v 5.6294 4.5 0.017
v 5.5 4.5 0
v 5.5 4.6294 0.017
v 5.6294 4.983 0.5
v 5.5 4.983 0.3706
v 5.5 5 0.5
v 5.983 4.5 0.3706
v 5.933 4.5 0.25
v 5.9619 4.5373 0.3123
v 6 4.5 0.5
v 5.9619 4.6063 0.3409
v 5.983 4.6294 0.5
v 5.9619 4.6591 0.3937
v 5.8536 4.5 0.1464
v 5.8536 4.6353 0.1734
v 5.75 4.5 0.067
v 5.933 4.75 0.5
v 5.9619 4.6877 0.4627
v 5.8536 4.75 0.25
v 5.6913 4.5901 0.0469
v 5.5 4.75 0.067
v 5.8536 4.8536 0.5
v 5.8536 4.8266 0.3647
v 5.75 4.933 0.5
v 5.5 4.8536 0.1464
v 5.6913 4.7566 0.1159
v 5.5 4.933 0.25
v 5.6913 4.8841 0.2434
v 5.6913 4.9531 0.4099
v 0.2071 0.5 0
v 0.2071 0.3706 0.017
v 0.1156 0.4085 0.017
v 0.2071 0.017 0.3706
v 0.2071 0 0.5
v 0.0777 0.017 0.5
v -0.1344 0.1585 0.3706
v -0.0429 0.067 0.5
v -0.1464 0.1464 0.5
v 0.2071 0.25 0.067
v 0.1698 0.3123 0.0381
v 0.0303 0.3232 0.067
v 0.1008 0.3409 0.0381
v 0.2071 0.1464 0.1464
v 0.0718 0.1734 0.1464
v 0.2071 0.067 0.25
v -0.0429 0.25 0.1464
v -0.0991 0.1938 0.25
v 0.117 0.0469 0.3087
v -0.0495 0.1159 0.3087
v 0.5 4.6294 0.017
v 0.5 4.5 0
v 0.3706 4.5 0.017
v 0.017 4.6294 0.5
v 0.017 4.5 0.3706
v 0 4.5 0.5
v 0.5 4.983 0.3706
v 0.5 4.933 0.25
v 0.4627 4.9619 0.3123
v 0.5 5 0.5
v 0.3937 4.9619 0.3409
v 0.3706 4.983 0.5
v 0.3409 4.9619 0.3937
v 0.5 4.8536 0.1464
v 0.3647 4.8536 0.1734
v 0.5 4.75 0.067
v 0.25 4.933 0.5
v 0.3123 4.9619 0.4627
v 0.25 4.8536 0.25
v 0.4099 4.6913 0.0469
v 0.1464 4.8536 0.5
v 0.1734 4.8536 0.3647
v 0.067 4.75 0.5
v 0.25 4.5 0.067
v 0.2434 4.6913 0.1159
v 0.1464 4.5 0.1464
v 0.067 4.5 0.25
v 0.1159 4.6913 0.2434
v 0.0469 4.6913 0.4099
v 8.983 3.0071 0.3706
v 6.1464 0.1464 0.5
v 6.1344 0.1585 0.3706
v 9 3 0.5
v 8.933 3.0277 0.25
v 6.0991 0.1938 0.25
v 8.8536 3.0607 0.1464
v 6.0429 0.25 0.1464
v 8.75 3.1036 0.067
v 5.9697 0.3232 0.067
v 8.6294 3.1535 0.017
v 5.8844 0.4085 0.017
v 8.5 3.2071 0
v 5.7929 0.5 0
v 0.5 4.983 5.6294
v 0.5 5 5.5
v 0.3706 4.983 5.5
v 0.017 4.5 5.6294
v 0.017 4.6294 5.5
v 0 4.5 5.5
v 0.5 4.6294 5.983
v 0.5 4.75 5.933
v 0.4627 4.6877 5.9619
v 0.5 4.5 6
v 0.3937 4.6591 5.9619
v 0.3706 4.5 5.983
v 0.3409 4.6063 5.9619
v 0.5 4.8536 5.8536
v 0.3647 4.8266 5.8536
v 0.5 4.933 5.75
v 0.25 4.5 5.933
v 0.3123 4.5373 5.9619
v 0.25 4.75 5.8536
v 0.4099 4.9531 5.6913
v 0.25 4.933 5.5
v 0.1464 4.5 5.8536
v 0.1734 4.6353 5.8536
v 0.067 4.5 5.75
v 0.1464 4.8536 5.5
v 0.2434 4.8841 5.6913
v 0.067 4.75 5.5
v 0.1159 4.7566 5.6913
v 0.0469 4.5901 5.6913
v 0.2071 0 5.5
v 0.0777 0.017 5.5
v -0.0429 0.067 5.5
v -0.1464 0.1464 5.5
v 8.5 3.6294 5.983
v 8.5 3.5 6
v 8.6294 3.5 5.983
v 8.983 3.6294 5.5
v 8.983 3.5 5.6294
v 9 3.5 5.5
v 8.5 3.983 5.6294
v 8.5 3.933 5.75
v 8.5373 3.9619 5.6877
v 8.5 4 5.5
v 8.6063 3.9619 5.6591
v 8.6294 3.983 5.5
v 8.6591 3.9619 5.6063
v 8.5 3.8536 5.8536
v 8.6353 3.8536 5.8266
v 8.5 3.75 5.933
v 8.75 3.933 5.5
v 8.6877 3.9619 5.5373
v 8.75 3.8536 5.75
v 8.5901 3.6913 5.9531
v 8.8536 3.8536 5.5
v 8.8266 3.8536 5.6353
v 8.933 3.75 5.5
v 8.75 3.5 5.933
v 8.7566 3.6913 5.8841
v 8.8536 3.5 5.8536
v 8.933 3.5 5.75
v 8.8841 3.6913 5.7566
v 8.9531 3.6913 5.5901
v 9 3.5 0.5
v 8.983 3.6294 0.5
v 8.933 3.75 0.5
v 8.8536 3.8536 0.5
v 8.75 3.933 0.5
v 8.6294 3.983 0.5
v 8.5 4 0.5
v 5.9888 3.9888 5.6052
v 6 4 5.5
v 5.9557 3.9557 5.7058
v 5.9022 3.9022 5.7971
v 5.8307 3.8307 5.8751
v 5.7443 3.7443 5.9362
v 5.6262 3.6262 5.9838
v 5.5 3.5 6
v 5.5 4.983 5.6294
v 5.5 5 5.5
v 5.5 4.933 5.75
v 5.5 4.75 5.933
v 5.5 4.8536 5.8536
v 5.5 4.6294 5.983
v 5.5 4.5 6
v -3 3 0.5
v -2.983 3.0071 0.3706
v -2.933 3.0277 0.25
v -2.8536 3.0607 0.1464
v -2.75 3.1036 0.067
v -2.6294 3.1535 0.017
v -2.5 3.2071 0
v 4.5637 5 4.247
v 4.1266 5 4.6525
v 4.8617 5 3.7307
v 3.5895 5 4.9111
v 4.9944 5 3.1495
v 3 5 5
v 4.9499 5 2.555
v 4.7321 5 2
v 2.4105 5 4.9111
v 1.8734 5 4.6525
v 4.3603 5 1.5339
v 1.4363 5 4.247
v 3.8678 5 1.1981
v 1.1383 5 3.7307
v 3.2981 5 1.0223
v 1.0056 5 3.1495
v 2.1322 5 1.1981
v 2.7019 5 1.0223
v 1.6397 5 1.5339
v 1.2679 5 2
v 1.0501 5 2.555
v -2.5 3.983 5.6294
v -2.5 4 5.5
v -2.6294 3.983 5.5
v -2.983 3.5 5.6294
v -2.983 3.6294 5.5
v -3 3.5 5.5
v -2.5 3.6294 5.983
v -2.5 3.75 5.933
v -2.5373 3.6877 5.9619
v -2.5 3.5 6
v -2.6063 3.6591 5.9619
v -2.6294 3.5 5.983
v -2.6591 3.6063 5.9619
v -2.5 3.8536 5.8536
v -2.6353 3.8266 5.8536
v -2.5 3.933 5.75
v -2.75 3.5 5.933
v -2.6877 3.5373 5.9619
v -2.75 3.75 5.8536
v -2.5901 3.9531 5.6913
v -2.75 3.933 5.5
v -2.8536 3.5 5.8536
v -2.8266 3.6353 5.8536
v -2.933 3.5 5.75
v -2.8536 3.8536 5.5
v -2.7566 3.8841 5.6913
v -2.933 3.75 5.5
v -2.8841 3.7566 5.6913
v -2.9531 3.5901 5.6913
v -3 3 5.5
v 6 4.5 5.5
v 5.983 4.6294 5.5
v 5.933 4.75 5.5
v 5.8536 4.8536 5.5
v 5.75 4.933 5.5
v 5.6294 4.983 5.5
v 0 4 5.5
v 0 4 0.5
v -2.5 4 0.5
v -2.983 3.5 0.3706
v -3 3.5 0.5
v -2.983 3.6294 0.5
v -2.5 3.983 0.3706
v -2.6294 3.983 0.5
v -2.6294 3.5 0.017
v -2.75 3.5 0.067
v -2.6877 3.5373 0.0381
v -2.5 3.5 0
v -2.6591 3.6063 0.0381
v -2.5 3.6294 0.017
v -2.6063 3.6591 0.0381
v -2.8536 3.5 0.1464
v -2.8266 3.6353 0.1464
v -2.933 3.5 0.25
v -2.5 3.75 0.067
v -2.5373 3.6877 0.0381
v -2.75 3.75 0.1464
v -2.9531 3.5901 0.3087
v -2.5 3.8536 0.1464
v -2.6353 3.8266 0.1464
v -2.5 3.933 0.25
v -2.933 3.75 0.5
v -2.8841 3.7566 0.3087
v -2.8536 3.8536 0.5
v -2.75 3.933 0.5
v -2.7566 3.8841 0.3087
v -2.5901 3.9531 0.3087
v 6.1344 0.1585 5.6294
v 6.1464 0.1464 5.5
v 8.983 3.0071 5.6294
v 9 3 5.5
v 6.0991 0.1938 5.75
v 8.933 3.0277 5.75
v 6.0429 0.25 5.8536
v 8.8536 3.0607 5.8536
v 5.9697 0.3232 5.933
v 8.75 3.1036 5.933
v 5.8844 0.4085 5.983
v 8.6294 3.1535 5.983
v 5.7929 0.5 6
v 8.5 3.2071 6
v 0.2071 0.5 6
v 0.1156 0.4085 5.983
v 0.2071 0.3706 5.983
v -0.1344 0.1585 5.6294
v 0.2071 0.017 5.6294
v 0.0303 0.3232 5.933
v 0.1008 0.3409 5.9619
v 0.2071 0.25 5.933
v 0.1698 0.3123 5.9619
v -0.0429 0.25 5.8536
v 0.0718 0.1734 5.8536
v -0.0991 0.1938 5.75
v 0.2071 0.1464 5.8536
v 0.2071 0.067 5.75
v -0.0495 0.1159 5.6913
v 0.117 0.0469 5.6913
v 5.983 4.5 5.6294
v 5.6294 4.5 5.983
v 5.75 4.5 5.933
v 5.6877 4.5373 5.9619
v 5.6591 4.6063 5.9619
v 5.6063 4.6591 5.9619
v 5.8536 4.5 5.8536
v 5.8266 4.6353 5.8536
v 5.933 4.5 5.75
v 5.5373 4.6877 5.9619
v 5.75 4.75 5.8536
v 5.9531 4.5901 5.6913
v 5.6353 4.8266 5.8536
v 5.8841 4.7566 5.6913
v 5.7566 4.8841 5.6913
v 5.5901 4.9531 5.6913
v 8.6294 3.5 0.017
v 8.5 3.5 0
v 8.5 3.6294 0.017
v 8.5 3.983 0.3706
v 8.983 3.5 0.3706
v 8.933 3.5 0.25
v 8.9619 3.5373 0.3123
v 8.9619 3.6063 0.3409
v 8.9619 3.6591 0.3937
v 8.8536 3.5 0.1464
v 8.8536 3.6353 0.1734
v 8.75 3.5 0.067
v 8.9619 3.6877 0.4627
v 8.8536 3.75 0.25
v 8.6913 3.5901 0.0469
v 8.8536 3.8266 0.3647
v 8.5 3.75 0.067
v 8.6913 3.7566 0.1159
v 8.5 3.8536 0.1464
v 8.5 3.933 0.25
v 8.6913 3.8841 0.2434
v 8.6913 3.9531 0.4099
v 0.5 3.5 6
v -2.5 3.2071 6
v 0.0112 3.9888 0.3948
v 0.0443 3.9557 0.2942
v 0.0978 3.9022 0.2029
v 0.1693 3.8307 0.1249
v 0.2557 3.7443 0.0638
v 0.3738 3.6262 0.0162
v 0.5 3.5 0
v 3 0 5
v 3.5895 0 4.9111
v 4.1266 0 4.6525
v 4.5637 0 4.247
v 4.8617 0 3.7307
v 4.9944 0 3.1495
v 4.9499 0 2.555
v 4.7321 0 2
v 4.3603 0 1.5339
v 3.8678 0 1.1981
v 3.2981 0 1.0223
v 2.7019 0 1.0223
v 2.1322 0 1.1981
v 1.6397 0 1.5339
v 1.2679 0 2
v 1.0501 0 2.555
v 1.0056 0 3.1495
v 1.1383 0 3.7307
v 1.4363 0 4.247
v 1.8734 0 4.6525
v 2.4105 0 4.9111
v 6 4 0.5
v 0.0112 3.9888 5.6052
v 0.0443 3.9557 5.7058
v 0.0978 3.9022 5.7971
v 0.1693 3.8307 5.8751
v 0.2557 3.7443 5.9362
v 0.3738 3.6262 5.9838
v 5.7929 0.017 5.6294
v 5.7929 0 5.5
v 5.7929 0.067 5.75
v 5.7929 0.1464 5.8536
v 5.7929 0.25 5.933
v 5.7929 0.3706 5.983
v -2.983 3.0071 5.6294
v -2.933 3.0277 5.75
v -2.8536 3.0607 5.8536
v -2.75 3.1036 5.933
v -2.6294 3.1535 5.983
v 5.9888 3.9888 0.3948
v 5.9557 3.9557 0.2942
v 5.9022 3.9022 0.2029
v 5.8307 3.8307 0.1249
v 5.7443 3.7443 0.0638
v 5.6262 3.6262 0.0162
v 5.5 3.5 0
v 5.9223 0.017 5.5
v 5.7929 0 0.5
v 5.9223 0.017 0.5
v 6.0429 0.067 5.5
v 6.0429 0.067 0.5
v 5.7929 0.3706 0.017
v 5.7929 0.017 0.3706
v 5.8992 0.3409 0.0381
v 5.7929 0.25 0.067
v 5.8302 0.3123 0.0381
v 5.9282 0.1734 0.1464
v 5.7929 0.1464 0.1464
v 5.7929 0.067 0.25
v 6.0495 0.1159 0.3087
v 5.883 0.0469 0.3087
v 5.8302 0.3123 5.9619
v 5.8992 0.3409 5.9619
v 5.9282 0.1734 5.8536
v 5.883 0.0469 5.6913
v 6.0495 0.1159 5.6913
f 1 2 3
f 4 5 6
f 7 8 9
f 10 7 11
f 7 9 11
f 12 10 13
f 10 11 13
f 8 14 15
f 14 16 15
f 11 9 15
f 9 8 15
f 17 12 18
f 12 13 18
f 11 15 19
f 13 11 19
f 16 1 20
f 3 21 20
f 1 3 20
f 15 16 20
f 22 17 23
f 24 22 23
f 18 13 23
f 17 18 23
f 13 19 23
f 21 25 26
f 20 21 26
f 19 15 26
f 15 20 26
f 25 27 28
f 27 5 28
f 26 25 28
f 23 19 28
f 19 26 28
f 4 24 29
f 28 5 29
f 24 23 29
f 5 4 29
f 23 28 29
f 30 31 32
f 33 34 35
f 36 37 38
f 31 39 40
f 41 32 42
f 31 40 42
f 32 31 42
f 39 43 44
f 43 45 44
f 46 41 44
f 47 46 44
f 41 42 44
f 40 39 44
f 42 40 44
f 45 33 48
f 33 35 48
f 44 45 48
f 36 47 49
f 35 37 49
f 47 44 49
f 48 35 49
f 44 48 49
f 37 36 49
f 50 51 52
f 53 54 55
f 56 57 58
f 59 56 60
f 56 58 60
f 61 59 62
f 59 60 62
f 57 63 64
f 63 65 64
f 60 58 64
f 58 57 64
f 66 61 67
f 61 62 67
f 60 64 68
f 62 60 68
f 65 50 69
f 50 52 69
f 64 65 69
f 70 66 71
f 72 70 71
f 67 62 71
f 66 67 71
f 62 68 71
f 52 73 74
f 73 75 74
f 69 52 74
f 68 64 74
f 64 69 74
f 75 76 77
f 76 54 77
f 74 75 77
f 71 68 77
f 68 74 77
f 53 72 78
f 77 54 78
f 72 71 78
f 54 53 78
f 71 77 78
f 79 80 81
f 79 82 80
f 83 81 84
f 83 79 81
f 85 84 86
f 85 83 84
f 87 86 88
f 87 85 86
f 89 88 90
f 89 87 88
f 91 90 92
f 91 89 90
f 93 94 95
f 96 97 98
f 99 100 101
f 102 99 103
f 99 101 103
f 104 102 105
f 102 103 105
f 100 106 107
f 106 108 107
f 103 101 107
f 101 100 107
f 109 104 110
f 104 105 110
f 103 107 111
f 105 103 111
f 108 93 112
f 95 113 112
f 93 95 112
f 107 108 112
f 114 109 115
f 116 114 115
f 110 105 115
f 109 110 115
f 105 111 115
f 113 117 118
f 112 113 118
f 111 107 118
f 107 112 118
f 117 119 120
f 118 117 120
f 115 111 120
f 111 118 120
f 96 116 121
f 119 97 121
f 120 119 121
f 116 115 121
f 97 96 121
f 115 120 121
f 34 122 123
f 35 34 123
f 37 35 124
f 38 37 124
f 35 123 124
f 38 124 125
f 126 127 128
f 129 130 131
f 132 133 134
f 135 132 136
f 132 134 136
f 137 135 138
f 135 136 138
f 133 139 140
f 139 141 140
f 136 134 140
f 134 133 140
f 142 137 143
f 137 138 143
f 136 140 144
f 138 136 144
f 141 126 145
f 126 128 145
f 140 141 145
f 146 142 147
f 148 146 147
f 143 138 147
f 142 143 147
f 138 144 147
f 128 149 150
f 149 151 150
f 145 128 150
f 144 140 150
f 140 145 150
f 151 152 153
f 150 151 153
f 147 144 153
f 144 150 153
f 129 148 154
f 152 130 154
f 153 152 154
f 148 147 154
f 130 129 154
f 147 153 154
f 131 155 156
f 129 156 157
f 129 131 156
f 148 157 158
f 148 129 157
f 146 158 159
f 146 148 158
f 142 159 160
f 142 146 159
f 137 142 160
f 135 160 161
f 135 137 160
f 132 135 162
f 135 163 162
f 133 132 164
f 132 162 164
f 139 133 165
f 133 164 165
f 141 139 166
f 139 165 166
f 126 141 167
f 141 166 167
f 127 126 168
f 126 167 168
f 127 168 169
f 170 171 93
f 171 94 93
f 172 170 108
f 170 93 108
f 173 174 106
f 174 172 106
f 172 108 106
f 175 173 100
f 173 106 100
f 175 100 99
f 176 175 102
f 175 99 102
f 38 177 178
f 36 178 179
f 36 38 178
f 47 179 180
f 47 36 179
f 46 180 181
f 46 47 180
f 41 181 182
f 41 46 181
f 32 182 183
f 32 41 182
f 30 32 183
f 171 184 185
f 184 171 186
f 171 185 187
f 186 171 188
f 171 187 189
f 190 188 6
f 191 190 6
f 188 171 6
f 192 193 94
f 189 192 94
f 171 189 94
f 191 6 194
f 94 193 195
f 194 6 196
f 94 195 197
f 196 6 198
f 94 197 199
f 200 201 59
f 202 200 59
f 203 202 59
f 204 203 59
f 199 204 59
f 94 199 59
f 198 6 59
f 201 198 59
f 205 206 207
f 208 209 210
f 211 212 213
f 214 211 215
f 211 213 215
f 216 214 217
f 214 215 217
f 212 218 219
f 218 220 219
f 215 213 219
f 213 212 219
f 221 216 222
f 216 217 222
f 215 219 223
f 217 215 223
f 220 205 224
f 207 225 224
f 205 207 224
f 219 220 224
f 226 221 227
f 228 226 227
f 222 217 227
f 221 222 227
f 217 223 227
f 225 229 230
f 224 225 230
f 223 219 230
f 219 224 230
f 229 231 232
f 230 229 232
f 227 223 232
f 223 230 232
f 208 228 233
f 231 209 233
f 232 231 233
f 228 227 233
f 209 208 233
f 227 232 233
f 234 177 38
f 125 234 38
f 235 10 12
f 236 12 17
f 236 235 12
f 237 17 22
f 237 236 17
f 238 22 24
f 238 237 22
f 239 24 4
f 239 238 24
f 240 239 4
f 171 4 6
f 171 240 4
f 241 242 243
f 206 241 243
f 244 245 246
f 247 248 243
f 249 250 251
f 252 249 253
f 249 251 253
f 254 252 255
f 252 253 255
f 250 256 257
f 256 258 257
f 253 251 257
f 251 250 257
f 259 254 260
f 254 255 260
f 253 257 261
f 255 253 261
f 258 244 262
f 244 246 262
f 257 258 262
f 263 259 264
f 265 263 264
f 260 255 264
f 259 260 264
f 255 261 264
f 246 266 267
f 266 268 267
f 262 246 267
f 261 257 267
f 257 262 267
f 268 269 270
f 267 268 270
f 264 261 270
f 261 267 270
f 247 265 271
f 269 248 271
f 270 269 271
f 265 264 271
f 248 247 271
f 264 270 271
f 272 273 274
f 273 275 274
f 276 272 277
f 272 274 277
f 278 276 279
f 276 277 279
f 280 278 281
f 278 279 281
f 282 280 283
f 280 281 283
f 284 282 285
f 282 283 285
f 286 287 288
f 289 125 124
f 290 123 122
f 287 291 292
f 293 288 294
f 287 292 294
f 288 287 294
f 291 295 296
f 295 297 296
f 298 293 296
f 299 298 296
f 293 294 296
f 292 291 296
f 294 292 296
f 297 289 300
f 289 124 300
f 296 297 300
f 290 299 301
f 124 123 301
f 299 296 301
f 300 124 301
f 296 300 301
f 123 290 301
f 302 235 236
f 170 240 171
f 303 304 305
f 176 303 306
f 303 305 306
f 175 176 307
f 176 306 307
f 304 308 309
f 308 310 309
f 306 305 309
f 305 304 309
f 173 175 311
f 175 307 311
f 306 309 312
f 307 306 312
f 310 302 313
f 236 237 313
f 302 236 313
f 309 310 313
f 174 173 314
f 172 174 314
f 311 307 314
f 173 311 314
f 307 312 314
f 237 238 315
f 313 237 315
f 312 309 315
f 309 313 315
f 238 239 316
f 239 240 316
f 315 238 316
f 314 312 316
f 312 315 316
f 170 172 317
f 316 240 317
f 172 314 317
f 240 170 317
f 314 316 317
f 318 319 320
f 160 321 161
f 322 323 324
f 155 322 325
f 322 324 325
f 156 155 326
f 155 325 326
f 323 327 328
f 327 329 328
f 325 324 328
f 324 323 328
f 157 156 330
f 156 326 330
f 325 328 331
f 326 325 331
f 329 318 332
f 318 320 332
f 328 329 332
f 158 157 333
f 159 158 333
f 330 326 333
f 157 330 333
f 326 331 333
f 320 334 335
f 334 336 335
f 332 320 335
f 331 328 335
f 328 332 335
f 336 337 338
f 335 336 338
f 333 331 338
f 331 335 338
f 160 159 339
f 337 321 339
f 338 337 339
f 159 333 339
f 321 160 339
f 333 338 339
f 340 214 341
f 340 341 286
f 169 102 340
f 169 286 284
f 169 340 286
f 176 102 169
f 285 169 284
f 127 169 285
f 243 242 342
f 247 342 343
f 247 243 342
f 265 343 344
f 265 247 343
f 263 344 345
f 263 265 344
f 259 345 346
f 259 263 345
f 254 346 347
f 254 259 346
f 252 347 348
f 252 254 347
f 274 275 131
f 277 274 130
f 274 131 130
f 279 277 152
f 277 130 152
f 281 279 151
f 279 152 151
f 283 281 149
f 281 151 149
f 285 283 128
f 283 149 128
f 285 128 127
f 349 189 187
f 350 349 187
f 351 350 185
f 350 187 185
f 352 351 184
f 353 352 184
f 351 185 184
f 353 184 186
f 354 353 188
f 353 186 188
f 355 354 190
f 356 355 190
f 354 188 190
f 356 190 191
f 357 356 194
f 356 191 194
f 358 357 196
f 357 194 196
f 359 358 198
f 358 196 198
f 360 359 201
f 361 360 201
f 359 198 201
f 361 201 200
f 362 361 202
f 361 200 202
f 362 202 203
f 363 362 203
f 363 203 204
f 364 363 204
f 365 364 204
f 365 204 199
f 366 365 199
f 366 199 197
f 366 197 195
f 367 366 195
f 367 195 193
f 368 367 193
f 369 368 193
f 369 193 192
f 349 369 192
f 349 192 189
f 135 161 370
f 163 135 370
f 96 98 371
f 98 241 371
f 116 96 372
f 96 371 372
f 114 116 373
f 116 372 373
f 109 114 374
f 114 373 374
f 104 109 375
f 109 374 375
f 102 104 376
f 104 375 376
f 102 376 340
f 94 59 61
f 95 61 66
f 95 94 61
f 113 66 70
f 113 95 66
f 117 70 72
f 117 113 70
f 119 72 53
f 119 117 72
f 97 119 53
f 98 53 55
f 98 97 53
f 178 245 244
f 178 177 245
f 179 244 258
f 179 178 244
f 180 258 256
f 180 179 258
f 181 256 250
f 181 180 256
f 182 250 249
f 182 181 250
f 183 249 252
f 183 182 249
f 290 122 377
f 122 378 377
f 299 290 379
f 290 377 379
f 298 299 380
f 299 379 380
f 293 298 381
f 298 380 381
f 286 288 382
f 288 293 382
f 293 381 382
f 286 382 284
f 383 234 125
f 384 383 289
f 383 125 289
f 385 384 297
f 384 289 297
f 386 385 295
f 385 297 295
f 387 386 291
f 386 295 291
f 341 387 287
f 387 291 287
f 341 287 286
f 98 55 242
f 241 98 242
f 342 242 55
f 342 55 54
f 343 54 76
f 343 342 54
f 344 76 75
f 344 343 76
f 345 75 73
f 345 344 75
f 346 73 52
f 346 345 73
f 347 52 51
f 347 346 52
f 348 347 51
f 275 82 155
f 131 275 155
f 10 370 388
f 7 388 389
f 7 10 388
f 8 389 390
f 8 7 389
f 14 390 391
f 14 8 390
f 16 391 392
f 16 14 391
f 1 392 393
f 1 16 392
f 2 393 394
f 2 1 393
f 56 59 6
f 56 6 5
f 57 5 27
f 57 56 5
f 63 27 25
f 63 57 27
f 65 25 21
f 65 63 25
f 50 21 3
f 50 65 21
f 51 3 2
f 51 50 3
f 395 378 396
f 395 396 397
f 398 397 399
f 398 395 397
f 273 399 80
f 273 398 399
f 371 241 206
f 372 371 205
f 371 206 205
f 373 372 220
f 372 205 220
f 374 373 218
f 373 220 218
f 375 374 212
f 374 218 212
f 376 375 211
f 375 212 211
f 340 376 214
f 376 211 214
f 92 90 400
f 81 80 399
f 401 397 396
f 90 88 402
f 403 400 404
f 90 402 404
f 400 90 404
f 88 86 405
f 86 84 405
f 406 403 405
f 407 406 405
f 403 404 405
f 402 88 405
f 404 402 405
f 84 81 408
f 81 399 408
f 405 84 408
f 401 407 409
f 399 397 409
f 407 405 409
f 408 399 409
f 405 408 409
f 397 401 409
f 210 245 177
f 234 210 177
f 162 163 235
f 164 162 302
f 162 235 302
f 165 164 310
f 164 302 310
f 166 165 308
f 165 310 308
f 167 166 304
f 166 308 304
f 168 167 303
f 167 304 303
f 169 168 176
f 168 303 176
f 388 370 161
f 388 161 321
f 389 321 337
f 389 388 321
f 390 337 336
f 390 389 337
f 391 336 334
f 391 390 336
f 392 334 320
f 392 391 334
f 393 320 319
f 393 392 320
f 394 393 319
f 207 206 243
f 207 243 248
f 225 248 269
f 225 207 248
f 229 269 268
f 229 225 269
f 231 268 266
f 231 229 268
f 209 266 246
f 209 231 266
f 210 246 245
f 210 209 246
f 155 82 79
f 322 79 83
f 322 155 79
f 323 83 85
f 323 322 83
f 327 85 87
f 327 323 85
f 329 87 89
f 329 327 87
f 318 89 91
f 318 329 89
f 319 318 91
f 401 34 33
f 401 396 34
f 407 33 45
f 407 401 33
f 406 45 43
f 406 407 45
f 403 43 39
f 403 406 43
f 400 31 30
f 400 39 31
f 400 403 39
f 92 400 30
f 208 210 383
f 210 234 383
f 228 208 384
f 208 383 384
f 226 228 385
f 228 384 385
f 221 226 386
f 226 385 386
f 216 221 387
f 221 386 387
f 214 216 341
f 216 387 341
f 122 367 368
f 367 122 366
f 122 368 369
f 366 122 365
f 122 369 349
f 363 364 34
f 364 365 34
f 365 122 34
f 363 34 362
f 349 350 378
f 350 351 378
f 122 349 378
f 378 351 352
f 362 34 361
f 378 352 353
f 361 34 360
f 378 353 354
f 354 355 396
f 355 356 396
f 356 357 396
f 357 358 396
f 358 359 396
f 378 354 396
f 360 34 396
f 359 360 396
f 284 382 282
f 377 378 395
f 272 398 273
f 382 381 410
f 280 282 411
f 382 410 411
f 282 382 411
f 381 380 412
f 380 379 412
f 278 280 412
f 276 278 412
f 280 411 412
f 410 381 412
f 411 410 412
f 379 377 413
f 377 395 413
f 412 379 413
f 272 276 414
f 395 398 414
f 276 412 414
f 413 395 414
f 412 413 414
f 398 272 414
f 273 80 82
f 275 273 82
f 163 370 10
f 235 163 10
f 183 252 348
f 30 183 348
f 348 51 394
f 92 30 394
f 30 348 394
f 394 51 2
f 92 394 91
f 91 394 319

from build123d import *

# Parameters (mm, degrees)
BOSS_EXTRUDE1_DEPTH = 6
FILLET1_R           = 0.5
SKETCH2_R           = 2
CUT_EXTRUDE1_DEPTH  = 12.916375288


with BuildPart() as part:
    # Sketch1 → Boss-Extrude1 (new body)
    with BuildSketch(Plane.XY):
        Polygon((0, 0), (6, 0), (9, 3), (9, 4), (6, 4), (6, 5), (0, 5), (0, 4), (-3, 4), (-3, 3), align=None)
    extrude(amount=BOSS_EXTRUDE1_DEPTH)

    # Fillet1
    fillet1_edges = [part.edges().sort_by_distance(p)[0] for p in [
        (7.5, 1.5, 6),
        (0, 4.5, 0),
        (3, 5, 0),
        (6, 4.5, 0),
        (7.5, 4, 0),
        (9, 3.5, 0),
        (7.5, 1.5, 0),
        (3, 0, 0),
        (-1.5, 1.5, 0),
        (9, 3.5, 6),
        (7.5, 4, 6),
        (-3, 4, 3),
        (0, 5, 3),
        (6, 5, 3),
        (9, 4, 3),
        (6, 0, 3),
        (0, 0, 3),
        (6, 4.5, 6),
        (3, 5, 6),
        (0, 4.5, 6),
        (-1.5, 4, 6),
        (-3, 3.5, 6),
        (-1.5, 1.5, 6),
        (3, 0, 6),
        (-3, 3.5, 0),
        (-1.5, 4, 0),
    ]]
    fillet(fillet1_edges, radius=FILLET1_R)

    # Sketch2 → Cut-Extrude1 (cut, through all)
    with BuildSketch(Plane(origin=(0, 5, 0), x_dir=(1, 0, 0), z_dir=(0, 1, 0))):
        with Locations(Location((3, -3, 0), (0, 0, 270))):
            Circle(SKETCH2_R)
    extrude(amount=-CUT_EXTRUDE1_DEPTH, mode=Mode.SUBTRACT)


solid = part.part
